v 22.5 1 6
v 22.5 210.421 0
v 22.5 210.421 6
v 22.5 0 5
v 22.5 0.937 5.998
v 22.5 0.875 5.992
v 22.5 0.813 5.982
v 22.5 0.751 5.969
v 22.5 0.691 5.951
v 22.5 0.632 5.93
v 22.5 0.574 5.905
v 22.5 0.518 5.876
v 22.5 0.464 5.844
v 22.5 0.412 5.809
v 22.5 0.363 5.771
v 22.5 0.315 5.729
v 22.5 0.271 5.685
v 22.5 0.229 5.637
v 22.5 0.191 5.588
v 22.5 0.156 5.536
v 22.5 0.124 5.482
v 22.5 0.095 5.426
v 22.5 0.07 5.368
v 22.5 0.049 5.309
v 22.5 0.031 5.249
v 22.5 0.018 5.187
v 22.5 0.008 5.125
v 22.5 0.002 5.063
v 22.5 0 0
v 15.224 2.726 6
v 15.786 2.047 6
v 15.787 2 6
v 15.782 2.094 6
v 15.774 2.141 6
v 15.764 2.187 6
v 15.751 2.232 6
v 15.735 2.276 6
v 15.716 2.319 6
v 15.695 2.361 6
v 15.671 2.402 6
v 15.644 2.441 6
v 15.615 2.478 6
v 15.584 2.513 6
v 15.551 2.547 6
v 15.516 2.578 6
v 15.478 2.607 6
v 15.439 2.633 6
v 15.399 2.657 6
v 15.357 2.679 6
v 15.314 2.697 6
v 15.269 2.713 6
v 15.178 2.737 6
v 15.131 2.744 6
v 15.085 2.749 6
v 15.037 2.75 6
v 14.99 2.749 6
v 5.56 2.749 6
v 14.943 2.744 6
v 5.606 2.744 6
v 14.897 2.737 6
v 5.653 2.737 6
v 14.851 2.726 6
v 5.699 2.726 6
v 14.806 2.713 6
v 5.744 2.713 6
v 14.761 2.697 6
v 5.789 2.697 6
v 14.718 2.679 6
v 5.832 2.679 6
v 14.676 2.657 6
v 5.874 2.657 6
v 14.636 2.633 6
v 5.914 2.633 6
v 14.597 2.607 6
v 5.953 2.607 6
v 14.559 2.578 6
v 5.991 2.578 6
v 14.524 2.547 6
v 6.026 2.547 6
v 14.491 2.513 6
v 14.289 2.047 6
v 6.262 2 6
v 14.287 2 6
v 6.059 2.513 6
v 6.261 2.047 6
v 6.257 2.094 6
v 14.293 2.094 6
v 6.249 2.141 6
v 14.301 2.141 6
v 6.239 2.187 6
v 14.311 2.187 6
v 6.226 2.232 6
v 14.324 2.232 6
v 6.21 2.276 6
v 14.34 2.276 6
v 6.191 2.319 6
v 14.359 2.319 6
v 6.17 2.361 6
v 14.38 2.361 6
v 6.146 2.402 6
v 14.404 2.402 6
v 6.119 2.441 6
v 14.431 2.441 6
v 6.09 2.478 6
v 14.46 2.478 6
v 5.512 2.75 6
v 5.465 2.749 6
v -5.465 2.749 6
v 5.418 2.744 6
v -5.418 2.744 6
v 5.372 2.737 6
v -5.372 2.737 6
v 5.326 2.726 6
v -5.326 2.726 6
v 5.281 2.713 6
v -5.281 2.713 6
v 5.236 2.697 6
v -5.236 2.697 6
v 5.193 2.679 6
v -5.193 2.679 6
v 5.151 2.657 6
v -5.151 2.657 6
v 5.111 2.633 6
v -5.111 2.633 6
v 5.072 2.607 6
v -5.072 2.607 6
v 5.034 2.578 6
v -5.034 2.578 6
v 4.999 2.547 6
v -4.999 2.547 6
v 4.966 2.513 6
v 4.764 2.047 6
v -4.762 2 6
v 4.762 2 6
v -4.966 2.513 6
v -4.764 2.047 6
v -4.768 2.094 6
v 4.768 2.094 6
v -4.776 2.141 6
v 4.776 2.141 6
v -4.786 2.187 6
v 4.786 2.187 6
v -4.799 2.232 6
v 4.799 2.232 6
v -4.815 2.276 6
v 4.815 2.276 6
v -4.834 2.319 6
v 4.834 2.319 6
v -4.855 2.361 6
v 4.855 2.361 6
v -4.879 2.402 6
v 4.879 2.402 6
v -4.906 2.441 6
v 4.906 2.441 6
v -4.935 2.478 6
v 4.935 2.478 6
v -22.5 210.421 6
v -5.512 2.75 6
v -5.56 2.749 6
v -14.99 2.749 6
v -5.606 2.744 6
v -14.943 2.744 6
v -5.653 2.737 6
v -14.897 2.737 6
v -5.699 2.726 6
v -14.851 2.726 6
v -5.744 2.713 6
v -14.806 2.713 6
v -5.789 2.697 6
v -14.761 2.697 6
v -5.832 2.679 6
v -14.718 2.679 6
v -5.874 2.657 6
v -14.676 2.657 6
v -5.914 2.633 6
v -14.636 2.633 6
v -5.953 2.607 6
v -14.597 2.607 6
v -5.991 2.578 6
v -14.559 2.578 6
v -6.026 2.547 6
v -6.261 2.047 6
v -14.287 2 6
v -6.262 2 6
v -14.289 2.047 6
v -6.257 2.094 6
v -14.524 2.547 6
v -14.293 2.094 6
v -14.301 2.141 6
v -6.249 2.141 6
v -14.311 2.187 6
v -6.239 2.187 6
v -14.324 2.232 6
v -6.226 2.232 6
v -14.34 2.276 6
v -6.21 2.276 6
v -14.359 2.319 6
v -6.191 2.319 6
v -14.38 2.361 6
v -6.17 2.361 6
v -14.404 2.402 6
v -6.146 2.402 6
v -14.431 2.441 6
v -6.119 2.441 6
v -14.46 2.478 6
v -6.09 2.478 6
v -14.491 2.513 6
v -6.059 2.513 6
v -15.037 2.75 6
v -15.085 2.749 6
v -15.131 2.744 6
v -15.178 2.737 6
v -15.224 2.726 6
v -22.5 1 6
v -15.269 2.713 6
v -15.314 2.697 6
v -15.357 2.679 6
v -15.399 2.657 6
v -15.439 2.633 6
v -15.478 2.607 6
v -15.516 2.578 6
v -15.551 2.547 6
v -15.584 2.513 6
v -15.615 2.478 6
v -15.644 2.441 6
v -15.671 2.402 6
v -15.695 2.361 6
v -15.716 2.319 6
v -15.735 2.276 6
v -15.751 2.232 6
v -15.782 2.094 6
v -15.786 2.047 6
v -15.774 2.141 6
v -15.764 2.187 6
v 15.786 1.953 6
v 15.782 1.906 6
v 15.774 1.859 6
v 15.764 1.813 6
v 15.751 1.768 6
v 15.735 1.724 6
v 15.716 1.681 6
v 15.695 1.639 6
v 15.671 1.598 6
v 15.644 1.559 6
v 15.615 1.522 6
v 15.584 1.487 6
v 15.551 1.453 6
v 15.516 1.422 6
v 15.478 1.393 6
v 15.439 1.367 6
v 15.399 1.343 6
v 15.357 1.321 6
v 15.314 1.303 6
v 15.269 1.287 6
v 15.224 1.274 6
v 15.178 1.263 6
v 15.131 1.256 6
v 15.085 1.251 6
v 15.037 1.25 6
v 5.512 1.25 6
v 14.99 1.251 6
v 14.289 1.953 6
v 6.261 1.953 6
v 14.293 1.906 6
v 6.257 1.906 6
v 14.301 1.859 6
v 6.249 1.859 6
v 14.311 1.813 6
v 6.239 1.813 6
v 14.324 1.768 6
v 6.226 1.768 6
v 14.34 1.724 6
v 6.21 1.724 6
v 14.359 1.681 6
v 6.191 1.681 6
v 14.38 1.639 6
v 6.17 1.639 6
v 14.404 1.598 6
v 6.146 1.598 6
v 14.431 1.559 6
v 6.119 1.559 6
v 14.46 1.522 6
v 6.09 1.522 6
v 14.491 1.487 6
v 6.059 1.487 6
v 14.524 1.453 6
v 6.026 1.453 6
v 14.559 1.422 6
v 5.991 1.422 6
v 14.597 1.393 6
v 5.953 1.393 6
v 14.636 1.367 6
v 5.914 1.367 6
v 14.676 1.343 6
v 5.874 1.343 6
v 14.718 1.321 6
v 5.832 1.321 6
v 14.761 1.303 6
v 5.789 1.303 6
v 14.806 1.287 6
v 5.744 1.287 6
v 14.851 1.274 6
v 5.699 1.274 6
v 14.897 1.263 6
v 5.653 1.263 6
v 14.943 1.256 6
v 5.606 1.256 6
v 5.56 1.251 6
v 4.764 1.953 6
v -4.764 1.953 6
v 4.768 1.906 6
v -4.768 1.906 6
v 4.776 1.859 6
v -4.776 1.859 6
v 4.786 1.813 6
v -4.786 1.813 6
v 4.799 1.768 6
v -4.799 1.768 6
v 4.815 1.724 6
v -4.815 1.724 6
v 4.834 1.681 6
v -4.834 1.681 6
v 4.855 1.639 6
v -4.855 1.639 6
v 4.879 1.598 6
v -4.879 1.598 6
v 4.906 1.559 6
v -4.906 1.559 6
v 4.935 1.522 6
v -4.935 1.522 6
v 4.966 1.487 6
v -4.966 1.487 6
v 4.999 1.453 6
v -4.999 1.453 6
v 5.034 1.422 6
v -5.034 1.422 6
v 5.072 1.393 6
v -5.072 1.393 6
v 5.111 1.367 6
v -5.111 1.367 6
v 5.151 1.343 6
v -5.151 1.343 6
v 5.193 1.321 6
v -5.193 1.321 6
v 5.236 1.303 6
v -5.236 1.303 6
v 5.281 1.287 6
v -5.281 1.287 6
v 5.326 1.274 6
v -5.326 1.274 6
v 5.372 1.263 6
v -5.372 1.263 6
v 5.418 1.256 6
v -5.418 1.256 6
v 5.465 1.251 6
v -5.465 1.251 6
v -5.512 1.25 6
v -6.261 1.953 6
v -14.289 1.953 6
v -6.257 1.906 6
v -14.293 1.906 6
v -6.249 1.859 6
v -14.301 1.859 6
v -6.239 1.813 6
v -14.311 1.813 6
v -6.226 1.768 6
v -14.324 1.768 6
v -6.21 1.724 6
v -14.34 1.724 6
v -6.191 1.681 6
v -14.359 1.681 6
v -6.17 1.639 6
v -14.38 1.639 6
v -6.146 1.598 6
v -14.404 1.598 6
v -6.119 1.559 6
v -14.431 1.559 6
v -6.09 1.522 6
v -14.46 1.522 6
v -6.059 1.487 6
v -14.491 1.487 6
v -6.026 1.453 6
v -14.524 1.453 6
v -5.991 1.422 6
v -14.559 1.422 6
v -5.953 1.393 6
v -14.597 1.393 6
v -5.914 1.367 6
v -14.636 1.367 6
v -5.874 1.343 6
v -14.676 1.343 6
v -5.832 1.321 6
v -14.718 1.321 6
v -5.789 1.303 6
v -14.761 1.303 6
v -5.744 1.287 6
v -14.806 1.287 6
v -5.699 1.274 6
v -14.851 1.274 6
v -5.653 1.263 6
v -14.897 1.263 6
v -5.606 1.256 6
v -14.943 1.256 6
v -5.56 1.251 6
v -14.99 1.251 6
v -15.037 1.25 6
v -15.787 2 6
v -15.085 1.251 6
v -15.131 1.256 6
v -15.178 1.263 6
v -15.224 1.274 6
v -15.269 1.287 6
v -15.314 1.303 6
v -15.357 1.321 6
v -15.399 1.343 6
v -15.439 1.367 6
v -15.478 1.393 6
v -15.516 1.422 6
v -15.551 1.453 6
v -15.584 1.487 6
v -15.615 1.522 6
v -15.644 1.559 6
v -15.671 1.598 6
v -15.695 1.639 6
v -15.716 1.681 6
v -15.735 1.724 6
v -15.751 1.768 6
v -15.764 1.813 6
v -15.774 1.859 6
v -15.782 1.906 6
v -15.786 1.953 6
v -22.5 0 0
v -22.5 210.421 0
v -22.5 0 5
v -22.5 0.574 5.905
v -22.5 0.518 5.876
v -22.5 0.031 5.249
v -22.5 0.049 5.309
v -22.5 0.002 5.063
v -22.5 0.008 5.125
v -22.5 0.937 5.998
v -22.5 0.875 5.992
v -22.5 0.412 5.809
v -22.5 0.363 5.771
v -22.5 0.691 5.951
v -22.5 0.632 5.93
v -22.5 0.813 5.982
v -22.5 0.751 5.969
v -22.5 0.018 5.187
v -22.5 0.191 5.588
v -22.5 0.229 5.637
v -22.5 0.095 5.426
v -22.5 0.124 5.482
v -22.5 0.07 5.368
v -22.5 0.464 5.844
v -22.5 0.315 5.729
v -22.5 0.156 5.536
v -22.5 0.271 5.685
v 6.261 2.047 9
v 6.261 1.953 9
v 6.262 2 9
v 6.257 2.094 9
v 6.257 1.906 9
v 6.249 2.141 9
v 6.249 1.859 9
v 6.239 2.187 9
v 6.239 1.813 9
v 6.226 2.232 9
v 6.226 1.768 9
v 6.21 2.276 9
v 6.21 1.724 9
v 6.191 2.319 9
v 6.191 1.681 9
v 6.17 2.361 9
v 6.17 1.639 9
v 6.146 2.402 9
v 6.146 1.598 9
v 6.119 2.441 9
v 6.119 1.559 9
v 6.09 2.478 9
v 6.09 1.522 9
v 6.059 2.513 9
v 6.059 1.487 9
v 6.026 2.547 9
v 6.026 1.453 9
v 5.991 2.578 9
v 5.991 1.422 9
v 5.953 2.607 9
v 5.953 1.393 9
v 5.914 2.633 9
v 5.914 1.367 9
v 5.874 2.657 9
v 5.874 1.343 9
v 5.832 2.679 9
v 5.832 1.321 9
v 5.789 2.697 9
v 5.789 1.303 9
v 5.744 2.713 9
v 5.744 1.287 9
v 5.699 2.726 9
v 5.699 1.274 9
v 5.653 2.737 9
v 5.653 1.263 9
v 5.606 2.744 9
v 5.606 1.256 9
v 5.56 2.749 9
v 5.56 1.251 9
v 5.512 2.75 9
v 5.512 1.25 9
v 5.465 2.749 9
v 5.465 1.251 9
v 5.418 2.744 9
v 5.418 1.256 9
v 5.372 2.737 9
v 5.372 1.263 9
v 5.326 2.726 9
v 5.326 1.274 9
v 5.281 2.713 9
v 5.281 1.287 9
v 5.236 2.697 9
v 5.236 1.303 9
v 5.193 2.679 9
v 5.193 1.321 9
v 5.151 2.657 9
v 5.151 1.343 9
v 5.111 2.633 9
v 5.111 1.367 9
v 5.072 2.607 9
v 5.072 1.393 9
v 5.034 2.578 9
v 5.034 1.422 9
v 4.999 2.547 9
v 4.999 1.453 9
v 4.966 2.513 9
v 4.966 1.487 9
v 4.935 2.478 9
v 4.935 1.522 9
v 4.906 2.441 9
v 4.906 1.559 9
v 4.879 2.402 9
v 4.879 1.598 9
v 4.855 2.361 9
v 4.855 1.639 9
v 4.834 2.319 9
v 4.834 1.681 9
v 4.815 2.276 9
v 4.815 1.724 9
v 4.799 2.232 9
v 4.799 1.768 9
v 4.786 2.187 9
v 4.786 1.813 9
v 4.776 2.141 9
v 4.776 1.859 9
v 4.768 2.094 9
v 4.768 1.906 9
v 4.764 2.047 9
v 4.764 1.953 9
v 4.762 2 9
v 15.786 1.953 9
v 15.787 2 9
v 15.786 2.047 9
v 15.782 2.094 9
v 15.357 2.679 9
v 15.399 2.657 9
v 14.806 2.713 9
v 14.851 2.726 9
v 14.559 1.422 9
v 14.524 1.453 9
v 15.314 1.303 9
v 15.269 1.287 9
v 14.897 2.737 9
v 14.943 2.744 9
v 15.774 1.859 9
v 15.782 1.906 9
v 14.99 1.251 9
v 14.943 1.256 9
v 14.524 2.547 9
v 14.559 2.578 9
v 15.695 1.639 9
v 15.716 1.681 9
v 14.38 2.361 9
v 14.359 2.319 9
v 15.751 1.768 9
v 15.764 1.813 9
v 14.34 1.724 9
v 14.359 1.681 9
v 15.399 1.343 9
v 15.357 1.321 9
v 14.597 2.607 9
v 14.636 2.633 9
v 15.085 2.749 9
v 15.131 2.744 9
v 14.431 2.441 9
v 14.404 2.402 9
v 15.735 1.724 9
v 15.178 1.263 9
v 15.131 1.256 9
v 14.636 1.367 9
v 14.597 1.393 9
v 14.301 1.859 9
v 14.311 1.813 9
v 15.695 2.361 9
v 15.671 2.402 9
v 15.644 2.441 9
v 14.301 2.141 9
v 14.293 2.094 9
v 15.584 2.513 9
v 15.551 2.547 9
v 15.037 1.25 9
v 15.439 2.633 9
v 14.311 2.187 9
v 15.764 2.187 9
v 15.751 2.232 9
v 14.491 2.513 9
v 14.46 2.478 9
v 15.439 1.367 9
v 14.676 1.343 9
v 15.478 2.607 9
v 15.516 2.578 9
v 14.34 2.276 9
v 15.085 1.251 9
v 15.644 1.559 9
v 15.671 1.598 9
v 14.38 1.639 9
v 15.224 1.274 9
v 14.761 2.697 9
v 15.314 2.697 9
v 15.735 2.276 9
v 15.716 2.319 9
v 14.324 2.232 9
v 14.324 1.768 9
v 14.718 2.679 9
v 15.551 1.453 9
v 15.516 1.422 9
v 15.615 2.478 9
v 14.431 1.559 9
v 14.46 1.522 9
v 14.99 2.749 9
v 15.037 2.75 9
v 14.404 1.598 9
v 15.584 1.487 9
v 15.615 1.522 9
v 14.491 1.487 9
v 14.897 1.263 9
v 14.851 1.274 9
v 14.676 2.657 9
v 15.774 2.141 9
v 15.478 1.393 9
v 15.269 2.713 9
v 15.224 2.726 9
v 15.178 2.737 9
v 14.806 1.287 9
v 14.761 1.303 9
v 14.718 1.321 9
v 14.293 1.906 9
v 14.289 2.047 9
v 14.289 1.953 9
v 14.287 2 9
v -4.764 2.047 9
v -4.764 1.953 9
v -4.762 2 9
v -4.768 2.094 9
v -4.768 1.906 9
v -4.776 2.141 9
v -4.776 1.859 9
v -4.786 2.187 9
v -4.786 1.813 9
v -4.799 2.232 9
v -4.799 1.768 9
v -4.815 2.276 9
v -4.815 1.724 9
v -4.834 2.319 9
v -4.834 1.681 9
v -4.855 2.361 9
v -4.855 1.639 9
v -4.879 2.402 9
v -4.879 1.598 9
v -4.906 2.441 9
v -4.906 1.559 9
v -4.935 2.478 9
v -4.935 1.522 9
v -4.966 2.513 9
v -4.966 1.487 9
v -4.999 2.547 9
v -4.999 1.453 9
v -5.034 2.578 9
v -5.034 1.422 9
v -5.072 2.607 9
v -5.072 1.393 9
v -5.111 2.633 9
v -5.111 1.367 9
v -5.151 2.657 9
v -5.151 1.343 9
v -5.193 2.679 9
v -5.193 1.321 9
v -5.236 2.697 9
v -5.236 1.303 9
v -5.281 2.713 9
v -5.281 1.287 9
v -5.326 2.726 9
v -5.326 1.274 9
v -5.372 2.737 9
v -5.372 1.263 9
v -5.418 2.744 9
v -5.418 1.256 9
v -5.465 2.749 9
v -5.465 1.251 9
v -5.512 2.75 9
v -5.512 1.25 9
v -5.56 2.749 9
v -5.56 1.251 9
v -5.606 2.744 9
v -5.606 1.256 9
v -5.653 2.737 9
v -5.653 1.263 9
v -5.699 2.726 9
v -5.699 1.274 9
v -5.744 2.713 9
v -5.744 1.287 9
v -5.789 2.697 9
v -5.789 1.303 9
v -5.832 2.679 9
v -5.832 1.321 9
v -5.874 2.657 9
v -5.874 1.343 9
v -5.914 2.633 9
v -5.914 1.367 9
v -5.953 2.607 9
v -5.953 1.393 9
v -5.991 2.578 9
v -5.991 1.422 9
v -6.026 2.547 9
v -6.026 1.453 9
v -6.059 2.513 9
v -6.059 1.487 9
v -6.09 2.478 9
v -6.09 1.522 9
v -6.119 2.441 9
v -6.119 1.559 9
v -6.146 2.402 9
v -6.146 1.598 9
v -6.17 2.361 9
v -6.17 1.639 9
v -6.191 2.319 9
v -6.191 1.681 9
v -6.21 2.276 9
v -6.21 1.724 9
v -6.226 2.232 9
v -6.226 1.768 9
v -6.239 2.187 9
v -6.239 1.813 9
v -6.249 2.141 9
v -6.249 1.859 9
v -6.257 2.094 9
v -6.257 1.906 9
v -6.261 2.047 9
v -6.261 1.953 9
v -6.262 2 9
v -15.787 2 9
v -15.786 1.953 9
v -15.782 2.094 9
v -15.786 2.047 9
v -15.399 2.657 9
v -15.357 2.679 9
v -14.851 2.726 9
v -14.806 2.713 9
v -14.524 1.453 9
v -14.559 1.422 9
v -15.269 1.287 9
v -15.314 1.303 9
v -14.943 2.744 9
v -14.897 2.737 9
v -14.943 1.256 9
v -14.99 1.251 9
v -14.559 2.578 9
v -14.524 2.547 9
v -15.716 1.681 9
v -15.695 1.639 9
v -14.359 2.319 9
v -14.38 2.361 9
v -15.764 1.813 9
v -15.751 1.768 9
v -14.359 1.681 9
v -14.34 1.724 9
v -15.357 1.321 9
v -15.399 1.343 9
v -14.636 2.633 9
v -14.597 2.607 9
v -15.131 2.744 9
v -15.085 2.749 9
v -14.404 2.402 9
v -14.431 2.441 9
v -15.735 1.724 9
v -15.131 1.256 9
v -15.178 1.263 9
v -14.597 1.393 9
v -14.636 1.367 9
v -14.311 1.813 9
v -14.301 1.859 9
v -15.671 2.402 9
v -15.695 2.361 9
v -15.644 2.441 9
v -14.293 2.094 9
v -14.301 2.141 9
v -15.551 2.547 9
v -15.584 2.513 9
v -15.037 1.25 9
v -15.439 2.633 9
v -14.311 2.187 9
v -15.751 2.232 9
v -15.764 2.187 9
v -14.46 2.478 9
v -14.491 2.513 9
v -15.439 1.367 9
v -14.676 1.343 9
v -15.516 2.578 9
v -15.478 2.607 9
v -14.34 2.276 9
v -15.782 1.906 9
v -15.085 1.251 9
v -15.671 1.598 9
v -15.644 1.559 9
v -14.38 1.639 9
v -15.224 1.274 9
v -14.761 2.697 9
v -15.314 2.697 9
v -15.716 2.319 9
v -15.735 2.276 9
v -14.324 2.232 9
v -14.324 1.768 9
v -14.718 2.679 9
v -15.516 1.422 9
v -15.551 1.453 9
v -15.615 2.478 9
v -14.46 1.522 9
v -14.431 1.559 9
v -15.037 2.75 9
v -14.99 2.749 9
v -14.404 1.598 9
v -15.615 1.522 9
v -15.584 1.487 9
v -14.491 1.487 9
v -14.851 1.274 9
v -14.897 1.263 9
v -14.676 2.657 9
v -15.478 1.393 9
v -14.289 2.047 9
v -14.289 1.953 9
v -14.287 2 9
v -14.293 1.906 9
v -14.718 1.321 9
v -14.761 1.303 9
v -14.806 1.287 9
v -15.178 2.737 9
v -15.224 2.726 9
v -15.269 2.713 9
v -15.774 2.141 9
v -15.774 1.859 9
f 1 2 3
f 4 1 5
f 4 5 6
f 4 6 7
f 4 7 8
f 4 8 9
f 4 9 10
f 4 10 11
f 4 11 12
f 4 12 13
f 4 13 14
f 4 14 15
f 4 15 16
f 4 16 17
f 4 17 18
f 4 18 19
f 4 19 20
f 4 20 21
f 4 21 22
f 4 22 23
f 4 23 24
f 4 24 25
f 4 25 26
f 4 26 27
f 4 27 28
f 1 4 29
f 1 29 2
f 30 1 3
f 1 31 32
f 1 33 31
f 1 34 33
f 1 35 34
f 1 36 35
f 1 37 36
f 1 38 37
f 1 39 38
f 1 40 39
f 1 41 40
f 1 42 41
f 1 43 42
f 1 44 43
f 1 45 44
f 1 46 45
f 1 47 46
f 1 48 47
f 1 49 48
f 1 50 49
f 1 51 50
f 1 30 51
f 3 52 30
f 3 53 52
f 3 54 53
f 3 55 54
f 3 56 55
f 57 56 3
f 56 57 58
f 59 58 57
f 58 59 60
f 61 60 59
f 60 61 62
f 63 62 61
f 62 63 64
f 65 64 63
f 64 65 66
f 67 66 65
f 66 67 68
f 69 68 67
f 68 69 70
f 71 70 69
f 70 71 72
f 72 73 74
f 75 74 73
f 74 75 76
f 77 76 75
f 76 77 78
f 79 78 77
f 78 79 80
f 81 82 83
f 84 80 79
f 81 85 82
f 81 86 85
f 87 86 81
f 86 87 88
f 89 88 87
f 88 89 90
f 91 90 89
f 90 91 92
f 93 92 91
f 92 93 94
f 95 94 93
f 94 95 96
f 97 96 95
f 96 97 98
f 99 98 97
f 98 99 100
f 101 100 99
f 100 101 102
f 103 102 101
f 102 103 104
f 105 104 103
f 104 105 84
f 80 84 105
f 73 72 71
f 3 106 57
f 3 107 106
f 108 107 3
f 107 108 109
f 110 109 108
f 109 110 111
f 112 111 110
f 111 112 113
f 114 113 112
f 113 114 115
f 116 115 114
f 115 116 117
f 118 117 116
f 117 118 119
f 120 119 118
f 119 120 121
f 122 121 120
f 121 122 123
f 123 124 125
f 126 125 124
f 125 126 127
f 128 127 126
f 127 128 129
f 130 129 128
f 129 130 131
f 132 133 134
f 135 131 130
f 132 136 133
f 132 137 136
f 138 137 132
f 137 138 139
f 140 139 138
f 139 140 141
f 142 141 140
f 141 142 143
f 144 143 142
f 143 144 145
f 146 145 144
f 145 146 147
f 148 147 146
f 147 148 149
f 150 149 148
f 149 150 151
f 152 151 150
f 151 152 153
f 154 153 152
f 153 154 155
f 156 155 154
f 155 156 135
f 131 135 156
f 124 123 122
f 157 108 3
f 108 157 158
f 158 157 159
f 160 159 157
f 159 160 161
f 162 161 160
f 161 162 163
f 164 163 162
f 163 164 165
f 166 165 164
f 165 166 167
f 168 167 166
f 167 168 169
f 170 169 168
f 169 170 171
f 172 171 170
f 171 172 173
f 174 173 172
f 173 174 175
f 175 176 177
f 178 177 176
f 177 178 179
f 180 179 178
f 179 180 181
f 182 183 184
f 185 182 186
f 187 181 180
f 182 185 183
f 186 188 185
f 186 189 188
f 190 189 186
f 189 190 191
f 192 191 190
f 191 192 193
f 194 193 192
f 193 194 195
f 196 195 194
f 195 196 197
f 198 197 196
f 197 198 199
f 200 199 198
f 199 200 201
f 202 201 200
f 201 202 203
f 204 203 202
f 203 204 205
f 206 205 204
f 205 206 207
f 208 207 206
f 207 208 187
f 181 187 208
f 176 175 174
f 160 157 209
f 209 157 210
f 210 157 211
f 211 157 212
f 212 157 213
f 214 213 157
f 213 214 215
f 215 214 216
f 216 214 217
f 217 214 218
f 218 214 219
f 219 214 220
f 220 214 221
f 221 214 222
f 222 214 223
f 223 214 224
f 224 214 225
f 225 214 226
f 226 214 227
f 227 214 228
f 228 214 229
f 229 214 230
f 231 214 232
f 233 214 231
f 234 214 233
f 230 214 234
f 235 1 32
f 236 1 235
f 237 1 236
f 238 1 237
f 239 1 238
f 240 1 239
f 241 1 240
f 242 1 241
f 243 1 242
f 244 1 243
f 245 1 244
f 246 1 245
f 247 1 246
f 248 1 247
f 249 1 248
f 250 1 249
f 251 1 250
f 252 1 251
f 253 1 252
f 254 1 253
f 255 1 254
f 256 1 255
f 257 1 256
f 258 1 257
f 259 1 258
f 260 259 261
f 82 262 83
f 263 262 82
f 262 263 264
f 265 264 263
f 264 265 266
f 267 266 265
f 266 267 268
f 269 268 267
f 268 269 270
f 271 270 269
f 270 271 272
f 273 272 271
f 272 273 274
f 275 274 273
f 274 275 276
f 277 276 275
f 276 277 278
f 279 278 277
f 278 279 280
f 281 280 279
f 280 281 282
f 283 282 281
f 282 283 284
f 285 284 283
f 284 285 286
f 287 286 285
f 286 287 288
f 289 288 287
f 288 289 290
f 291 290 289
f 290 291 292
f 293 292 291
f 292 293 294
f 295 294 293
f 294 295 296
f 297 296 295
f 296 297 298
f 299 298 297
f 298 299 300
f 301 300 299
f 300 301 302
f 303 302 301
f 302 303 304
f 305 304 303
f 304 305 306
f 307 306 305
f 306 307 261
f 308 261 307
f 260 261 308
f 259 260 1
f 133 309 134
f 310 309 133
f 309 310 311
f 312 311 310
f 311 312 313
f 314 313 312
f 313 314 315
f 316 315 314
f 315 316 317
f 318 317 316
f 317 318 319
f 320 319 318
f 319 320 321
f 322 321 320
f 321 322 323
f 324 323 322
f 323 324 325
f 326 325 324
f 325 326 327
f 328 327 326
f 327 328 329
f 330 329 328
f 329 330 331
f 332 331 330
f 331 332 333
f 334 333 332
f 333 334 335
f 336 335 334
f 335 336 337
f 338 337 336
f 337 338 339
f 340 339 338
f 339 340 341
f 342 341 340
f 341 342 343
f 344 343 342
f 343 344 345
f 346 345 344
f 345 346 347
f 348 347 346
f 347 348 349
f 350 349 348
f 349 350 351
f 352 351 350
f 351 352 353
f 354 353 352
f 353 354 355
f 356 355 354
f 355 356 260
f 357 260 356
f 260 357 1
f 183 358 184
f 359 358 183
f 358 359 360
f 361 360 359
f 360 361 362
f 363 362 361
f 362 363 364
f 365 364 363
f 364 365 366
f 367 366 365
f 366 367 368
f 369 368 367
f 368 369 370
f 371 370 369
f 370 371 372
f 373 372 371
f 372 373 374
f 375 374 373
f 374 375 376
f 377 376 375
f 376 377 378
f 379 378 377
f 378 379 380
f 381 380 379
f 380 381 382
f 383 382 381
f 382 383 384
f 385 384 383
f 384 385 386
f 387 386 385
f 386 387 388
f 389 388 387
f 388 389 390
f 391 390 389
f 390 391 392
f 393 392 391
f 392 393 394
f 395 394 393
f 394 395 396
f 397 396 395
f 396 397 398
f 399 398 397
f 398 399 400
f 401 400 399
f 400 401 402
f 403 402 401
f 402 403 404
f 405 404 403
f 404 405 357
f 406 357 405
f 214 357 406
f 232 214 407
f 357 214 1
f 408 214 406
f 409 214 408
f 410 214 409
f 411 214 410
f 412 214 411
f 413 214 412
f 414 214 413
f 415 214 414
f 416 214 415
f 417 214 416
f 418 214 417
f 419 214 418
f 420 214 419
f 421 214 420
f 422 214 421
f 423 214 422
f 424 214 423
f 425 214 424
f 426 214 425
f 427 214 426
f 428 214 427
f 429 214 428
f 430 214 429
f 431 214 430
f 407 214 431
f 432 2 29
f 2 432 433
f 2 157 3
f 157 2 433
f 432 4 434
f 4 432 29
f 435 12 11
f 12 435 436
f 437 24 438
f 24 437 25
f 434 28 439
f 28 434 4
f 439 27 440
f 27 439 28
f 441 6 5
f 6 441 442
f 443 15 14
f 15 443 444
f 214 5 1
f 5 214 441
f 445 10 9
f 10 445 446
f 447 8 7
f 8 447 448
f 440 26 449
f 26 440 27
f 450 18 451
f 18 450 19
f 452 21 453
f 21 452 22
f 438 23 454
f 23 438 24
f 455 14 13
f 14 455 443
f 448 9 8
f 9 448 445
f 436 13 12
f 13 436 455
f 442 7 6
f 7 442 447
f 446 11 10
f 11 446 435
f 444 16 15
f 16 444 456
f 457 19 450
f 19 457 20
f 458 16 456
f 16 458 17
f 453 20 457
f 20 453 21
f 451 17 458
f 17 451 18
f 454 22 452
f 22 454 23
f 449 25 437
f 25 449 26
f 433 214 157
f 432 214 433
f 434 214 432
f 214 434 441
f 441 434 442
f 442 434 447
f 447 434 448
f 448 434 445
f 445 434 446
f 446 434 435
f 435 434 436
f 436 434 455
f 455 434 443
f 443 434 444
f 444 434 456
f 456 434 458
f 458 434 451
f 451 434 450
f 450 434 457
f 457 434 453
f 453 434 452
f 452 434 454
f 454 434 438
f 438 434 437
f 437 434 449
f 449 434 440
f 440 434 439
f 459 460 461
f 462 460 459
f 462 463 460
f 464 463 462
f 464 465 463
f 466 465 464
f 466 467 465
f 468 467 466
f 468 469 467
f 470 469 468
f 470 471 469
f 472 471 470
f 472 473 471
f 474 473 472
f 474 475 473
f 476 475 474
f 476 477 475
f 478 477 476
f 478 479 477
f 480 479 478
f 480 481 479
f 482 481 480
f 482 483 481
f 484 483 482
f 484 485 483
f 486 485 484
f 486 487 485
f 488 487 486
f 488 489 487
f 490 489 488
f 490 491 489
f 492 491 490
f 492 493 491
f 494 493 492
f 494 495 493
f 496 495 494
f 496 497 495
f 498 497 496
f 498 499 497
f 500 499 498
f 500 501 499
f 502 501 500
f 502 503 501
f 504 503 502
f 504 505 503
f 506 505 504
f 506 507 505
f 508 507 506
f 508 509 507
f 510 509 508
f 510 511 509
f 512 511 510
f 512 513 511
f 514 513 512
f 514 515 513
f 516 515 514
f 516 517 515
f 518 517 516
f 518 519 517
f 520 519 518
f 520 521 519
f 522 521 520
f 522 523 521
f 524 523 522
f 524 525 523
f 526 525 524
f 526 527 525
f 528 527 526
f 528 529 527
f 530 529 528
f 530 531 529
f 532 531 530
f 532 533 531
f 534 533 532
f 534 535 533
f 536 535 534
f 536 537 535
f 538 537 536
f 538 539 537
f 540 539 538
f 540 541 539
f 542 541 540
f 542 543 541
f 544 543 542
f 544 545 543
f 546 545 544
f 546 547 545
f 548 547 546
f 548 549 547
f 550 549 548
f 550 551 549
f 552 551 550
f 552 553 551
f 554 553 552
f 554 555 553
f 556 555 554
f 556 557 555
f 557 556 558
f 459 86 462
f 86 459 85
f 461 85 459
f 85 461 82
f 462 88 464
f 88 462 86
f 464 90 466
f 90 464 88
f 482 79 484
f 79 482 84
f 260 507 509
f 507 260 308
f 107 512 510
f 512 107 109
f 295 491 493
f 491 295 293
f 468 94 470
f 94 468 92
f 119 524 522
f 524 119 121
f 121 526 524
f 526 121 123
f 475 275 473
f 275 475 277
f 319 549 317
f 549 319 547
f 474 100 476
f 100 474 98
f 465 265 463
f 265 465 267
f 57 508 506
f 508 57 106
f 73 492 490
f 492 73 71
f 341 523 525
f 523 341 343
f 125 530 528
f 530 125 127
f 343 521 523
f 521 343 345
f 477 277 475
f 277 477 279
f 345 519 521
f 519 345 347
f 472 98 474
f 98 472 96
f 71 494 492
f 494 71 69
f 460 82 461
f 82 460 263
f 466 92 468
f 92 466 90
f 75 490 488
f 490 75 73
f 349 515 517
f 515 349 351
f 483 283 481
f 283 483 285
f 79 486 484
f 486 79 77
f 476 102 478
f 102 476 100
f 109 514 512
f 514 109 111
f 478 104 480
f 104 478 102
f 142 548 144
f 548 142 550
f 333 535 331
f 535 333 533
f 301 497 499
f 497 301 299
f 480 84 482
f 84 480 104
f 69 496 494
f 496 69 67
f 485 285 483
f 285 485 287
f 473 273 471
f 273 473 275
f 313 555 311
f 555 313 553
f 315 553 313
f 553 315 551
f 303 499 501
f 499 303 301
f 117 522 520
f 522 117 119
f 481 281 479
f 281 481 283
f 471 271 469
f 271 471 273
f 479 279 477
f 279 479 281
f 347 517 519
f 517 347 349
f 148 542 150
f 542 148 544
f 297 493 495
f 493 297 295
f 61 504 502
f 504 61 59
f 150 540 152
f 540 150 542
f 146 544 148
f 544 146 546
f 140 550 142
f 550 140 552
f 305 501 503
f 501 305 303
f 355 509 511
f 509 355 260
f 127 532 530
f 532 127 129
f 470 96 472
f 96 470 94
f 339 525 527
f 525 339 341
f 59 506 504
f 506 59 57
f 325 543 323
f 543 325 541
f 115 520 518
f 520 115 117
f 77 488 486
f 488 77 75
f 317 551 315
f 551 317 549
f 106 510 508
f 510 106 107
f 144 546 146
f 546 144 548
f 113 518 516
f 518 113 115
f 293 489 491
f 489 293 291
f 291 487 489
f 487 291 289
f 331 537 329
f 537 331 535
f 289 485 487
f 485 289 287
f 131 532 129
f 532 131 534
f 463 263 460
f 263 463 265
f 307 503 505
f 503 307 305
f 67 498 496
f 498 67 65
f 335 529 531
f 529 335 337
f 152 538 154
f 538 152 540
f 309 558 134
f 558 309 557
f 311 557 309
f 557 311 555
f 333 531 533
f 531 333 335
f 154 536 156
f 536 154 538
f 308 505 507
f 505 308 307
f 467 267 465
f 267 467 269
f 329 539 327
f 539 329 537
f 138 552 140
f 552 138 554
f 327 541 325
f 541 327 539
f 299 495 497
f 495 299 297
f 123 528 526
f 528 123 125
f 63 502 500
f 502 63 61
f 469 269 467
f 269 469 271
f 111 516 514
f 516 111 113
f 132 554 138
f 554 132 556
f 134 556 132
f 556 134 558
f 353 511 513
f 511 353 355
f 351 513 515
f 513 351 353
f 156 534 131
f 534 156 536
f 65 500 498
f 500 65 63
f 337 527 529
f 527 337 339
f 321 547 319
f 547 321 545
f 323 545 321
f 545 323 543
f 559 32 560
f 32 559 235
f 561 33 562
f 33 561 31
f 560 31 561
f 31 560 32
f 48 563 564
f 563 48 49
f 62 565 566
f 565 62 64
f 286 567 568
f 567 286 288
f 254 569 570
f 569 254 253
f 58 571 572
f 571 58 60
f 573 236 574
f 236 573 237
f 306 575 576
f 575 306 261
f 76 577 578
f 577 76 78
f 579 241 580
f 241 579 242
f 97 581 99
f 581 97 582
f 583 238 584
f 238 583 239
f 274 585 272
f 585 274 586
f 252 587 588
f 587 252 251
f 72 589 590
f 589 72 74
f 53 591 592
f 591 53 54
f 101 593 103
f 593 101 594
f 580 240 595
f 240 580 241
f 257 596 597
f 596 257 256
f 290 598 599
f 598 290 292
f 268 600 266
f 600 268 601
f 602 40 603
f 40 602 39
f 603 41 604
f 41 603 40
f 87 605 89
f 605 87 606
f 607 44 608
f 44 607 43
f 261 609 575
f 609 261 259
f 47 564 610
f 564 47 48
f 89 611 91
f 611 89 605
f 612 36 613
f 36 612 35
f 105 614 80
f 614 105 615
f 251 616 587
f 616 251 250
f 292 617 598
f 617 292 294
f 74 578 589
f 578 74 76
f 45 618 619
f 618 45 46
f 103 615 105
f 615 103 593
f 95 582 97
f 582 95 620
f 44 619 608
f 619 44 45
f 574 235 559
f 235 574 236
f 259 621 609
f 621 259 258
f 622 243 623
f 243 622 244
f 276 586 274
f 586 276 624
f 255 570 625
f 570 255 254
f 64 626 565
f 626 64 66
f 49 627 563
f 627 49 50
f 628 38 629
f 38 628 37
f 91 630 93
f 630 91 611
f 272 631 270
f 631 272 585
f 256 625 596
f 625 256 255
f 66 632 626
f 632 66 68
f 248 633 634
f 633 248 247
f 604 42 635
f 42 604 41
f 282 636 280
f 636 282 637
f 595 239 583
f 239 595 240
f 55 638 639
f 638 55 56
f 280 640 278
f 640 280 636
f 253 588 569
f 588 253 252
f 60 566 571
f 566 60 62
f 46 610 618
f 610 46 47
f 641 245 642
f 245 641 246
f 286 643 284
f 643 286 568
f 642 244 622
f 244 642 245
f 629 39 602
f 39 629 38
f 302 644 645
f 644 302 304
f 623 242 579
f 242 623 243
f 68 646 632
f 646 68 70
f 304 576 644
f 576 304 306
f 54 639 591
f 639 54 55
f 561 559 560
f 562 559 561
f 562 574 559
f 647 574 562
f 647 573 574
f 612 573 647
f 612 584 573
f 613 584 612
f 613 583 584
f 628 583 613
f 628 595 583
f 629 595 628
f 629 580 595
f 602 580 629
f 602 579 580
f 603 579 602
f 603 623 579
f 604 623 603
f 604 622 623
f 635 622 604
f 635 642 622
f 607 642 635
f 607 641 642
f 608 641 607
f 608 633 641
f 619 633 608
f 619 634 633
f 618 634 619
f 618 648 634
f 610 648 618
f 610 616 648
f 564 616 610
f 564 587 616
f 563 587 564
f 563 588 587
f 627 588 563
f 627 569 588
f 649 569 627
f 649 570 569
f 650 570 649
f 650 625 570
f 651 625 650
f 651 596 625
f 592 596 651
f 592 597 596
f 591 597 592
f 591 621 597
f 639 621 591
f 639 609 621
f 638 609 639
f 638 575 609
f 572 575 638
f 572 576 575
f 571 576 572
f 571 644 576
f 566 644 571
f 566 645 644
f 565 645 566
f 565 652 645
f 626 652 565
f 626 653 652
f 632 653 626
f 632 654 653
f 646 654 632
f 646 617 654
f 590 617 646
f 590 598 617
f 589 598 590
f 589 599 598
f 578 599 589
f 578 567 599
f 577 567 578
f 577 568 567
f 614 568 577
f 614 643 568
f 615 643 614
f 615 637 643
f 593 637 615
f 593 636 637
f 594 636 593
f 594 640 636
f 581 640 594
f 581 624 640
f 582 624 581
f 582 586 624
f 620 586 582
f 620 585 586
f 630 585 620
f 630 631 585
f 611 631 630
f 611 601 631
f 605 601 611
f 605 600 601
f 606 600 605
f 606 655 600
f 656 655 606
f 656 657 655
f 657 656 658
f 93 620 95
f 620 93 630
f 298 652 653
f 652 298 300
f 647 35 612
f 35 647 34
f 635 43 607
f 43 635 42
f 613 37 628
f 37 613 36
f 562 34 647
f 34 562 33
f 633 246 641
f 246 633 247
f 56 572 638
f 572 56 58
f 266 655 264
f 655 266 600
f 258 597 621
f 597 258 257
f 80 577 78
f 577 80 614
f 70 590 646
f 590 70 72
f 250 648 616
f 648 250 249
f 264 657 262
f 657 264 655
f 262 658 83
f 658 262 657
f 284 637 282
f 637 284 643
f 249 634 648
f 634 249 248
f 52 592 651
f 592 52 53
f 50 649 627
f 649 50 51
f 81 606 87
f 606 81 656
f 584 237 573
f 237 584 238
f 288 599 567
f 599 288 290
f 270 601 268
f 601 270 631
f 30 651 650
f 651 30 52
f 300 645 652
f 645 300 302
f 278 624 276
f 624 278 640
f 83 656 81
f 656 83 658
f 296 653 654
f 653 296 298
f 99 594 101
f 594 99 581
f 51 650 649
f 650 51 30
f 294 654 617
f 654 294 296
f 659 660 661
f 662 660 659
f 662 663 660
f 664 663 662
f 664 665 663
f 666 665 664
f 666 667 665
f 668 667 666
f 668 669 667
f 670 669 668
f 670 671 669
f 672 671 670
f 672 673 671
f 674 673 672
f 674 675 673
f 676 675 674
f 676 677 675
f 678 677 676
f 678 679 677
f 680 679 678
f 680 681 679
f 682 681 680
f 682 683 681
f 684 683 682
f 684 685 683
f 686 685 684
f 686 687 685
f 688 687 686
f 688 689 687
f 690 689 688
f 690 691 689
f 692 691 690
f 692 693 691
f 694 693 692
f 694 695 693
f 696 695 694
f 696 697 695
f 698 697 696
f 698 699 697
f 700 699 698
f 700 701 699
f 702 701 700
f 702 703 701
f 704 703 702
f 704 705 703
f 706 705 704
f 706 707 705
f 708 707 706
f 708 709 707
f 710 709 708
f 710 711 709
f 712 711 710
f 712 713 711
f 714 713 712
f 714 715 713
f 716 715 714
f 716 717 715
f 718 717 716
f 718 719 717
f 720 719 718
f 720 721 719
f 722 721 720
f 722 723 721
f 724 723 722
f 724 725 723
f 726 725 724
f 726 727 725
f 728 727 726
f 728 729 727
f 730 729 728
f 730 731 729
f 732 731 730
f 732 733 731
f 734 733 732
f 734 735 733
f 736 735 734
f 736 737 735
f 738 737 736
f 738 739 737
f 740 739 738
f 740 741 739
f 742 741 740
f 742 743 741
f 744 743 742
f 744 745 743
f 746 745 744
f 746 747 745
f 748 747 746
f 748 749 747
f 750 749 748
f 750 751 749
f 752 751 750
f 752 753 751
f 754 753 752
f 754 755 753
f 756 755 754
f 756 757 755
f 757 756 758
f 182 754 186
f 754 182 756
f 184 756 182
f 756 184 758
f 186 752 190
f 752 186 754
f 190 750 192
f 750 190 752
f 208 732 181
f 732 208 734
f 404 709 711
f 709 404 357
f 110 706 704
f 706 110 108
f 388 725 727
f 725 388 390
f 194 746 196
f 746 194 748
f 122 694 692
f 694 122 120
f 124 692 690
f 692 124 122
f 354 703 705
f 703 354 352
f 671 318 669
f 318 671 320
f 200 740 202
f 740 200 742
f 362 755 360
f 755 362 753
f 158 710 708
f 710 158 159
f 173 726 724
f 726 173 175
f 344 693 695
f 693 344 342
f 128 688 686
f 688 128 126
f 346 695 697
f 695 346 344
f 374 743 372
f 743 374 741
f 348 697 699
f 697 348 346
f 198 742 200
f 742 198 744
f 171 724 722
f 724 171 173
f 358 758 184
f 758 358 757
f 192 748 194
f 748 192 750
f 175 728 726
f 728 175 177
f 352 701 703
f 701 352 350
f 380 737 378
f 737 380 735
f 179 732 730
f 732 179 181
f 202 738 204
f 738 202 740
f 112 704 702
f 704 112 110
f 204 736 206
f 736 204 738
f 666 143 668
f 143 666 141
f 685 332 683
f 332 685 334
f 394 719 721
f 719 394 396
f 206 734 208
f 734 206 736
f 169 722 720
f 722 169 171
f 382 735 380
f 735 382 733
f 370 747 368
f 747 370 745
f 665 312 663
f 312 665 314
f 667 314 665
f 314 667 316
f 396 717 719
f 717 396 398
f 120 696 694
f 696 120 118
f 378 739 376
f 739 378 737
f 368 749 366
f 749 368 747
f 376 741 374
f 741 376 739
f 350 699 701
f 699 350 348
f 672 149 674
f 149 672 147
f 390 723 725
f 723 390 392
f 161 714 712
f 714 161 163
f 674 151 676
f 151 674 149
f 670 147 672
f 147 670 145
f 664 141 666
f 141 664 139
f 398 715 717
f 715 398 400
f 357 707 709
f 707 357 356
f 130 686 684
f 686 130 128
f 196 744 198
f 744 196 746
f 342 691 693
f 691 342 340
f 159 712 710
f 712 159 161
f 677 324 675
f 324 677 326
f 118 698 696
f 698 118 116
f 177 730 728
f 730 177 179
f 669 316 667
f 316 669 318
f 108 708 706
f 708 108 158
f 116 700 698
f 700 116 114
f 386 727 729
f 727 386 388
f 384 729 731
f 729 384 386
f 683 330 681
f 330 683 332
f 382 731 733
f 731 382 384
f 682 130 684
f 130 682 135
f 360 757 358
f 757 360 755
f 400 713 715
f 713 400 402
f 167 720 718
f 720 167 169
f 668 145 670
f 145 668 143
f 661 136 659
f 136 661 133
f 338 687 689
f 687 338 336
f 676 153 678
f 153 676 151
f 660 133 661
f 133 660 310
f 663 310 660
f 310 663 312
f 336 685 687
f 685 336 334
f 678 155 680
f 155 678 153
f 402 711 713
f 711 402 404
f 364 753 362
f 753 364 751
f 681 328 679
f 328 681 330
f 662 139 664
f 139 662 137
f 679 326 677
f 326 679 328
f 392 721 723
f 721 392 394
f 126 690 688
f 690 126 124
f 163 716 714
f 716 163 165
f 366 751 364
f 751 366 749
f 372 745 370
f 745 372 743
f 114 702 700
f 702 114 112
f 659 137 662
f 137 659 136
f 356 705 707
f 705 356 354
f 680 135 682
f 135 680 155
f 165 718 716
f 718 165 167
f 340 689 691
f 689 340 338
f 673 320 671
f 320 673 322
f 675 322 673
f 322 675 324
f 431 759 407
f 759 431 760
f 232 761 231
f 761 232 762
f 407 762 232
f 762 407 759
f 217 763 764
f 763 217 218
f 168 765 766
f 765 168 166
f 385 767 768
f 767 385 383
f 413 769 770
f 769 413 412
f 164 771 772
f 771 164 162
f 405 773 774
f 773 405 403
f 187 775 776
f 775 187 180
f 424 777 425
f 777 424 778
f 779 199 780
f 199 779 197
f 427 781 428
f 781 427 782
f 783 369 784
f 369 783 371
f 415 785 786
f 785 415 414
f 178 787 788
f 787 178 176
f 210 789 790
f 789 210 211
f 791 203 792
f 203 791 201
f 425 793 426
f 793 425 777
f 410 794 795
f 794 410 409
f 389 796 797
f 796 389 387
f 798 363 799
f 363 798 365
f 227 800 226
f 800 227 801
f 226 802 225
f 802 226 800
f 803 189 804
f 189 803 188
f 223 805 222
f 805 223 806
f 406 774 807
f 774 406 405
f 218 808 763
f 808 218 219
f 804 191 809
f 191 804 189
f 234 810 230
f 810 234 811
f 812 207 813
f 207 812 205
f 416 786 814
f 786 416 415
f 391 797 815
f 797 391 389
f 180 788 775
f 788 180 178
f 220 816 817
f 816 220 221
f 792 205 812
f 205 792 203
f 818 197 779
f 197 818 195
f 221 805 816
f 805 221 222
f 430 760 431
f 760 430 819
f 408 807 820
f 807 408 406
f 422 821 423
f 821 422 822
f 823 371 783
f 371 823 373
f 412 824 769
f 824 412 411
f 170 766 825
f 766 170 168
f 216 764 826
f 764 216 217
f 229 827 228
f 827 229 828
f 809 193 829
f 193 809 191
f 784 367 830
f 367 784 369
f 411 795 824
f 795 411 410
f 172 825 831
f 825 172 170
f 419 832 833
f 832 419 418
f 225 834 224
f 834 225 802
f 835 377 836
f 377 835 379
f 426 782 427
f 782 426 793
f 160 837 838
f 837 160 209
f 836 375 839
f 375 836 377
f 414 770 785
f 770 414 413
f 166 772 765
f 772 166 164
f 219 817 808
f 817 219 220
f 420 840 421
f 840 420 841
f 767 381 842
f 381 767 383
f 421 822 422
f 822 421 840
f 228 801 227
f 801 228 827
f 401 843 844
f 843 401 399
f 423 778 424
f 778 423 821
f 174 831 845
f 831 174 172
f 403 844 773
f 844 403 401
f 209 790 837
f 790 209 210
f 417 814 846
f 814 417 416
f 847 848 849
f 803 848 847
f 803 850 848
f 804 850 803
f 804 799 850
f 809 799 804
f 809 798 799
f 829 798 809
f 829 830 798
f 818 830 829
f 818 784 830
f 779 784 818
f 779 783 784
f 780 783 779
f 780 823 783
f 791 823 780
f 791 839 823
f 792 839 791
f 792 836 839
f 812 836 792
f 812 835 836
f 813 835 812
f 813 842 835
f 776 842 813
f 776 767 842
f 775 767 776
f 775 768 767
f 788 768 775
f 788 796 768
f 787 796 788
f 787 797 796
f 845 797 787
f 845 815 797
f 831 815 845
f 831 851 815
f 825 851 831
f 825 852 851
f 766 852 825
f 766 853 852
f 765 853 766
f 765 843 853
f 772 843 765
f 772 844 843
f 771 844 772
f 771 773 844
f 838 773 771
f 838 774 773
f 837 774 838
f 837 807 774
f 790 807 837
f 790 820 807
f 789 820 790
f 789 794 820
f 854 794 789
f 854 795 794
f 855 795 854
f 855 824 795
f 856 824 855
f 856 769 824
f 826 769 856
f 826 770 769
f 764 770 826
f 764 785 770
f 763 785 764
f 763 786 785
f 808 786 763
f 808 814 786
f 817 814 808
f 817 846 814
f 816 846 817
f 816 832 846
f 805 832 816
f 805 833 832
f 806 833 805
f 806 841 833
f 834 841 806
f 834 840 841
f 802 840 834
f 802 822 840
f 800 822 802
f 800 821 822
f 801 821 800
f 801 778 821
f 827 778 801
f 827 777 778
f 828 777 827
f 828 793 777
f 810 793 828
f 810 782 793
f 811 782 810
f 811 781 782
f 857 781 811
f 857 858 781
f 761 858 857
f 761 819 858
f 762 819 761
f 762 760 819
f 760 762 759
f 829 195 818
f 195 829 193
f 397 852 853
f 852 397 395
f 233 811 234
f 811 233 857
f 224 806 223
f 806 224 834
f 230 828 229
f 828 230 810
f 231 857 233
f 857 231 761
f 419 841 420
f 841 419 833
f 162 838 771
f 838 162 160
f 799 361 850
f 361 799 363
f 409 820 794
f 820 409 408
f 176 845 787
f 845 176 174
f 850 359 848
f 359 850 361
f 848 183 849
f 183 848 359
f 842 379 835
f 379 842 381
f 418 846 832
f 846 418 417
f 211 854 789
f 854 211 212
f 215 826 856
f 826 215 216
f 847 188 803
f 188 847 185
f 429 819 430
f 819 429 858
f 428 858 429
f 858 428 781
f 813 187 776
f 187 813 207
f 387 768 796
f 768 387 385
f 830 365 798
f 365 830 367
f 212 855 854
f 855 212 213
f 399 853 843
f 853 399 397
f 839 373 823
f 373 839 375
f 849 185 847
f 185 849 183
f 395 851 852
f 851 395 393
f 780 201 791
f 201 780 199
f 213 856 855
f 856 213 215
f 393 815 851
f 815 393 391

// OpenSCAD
// file: functions.scad
function fretDistance(fret, scaleLength) =
    scaleLength - scaleLength / pow(2, fret / 12);

function lerp(a, b, x) =
    a + (b - a) * x;
// file: config.scad
use <functions.scad>;

$fn = 100;

// Body
// ----

// X, Y, Roundness
bodyTop = [0, 170, 40];
bodyBottom = [0, -60, 60];
lowerBout = [85, 0, 30];
upperBout = [65, 130, 30];
waist = [55, 80, 30];

bodyLength = [bodyTop[1] - bodyBottom[1]];
maxBodyWidth = [2 * lowerBout[2]];
bodyDepth = 50;

soundboardThickness = 1.8;
backThickness = 1.8;
sideThickness = 1.8;

sideDepth = bodyDepth - backThickness - soundboardThickness;

// Kerf
// ----

useKerf = true;
kerfWidth = 5;
kerfHeight = 10;

// Neck
// ----

neckWidthNarrow = 35;
neckWidthWide = 45;
neckDepthNarrow = 10;
neckDepthWide = 16;

// Heel
// ----

heelWidth = 10;
heelLength = 30;

// Heel Block
// ----------

heelBlockWidth = 30;
heelBlockDepth = 10;

// Heel Dovetail
// -------------

heelDovetailWidth = neckWidthWide - 20;
heelDovetailHeight = sideDepth + soundboardThickness - 10;
heelDovetailDepth = 10;
heelDovetailOffset = 5;
heelDovetailTaper = 1.1;

// Nut
// ---

nutWidth = 4;

pinHeight = 3;
pinRadius = 0.75;
stringSpacing = 9.525;

// Fingerboard
// -----------

scaleLength = 340;
numberOfFrets = 16;

fretWidth = 1.35;
fretDepth = 0.94;
maxFretLength = neckWidthWide;

fingerboardLength = fretDistance(numberOfFrets, scaleLength) + fretWidth + nutWidth;
maxFingerboardWidth = neckWidthWide;
fingerboardDepth = 6;

fingerboardSlopeRadius = 1;

fretFileAngle = 70;

// Beziers
// -------
topUpperBoutBezier = [
    [bodyTop[0], bodyTop[1]],
    [bodyBottom[0] + bodyTop[2], bodyTop[1]],
    [upperBout[0], upperBout[1] + upperBout[2]],
    [upperBout[0], upperBout[1]],
];

upperBoutWaistBezier = [
    [upperBout[0], upperBout[1]],
    [upperBout[0], upperBout[1] - upperBout[2]],
    [waist[0], waist[1] + waist[2]],
    [waist[0], waist[1]]
];

waistLowerBoutBezier = [
    [waist[0], waist[1]],
    [waist[0], waist[1] - waist[2]],
    [lowerBout[0], lowerBout[1] + lowerBout[2]],
    [lowerBout[0], lowerBout[1]]
];

lowerBoutBottomBezier = [
    [lowerBout[0], lowerBout[1]],
    [lowerBout[0], lowerBout[1] - lowerBout[2]],
    [bodyBottom[0] + bodyBottom[2], bodyBottom[1]],
    [bodyBottom[0], bodyBottom[1]]
];
// file: nut.scad
include <config.scad>;

module halfNut() {
    translate([0.5 * stringSpacing + pinRadius, 0, 0])
        cylinder(pinHeight, r=pinRadius, center=true);
    translate([1.5 * stringSpacing + pinRadius, 0, 0])
        cylinder(pinHeight, r=pinRadius, center=true);
}

module nut() {
    halfNut(pinHeight, pinRadius, stringSpacing);
    mirror([1, 0, 0])
        halfNut(pinHeight, pinRadius, stringSpacing);
}

nut(pinHeight, pinRadius, stringSpacing);
// file: fingerboard.scad
include <config.scad>;

module halfFingerboard() {
    translate([0, fingerboardSlopeRadius, 0])
        cube([maxFingerboardWidth / 2,
              fingerboardLength - fingerboardSlopeRadius,
              fingerboardDepth]);
        cube([maxFingerboardWidth / 2,
              fingerboardLength,
              fingerboardDepth - fingerboardSlopeRadius]);
    translate([0, fingerboardSlopeRadius,
               fingerboardDepth - fingerboardSlopeRadius])
        rotate([0, 90, 0])
            cylinder(maxFingerboardWidth / 2, r=fingerboardSlopeRadius);
}

module fingerboard() {
    halfFingerboard();
    mirror([1, 0, 0])
        halfFingerboard();
}

fingerboard();
// main file
use <fingerboard.scad>;
use <nut.scad>;
include <config.scad>;

module fingerboardNut() {
    fingerboard();
    translate([0, nutWidth / 2, fingerboardDepth + pinHeight / 2])
        nut();
}

fingerboardNut();
